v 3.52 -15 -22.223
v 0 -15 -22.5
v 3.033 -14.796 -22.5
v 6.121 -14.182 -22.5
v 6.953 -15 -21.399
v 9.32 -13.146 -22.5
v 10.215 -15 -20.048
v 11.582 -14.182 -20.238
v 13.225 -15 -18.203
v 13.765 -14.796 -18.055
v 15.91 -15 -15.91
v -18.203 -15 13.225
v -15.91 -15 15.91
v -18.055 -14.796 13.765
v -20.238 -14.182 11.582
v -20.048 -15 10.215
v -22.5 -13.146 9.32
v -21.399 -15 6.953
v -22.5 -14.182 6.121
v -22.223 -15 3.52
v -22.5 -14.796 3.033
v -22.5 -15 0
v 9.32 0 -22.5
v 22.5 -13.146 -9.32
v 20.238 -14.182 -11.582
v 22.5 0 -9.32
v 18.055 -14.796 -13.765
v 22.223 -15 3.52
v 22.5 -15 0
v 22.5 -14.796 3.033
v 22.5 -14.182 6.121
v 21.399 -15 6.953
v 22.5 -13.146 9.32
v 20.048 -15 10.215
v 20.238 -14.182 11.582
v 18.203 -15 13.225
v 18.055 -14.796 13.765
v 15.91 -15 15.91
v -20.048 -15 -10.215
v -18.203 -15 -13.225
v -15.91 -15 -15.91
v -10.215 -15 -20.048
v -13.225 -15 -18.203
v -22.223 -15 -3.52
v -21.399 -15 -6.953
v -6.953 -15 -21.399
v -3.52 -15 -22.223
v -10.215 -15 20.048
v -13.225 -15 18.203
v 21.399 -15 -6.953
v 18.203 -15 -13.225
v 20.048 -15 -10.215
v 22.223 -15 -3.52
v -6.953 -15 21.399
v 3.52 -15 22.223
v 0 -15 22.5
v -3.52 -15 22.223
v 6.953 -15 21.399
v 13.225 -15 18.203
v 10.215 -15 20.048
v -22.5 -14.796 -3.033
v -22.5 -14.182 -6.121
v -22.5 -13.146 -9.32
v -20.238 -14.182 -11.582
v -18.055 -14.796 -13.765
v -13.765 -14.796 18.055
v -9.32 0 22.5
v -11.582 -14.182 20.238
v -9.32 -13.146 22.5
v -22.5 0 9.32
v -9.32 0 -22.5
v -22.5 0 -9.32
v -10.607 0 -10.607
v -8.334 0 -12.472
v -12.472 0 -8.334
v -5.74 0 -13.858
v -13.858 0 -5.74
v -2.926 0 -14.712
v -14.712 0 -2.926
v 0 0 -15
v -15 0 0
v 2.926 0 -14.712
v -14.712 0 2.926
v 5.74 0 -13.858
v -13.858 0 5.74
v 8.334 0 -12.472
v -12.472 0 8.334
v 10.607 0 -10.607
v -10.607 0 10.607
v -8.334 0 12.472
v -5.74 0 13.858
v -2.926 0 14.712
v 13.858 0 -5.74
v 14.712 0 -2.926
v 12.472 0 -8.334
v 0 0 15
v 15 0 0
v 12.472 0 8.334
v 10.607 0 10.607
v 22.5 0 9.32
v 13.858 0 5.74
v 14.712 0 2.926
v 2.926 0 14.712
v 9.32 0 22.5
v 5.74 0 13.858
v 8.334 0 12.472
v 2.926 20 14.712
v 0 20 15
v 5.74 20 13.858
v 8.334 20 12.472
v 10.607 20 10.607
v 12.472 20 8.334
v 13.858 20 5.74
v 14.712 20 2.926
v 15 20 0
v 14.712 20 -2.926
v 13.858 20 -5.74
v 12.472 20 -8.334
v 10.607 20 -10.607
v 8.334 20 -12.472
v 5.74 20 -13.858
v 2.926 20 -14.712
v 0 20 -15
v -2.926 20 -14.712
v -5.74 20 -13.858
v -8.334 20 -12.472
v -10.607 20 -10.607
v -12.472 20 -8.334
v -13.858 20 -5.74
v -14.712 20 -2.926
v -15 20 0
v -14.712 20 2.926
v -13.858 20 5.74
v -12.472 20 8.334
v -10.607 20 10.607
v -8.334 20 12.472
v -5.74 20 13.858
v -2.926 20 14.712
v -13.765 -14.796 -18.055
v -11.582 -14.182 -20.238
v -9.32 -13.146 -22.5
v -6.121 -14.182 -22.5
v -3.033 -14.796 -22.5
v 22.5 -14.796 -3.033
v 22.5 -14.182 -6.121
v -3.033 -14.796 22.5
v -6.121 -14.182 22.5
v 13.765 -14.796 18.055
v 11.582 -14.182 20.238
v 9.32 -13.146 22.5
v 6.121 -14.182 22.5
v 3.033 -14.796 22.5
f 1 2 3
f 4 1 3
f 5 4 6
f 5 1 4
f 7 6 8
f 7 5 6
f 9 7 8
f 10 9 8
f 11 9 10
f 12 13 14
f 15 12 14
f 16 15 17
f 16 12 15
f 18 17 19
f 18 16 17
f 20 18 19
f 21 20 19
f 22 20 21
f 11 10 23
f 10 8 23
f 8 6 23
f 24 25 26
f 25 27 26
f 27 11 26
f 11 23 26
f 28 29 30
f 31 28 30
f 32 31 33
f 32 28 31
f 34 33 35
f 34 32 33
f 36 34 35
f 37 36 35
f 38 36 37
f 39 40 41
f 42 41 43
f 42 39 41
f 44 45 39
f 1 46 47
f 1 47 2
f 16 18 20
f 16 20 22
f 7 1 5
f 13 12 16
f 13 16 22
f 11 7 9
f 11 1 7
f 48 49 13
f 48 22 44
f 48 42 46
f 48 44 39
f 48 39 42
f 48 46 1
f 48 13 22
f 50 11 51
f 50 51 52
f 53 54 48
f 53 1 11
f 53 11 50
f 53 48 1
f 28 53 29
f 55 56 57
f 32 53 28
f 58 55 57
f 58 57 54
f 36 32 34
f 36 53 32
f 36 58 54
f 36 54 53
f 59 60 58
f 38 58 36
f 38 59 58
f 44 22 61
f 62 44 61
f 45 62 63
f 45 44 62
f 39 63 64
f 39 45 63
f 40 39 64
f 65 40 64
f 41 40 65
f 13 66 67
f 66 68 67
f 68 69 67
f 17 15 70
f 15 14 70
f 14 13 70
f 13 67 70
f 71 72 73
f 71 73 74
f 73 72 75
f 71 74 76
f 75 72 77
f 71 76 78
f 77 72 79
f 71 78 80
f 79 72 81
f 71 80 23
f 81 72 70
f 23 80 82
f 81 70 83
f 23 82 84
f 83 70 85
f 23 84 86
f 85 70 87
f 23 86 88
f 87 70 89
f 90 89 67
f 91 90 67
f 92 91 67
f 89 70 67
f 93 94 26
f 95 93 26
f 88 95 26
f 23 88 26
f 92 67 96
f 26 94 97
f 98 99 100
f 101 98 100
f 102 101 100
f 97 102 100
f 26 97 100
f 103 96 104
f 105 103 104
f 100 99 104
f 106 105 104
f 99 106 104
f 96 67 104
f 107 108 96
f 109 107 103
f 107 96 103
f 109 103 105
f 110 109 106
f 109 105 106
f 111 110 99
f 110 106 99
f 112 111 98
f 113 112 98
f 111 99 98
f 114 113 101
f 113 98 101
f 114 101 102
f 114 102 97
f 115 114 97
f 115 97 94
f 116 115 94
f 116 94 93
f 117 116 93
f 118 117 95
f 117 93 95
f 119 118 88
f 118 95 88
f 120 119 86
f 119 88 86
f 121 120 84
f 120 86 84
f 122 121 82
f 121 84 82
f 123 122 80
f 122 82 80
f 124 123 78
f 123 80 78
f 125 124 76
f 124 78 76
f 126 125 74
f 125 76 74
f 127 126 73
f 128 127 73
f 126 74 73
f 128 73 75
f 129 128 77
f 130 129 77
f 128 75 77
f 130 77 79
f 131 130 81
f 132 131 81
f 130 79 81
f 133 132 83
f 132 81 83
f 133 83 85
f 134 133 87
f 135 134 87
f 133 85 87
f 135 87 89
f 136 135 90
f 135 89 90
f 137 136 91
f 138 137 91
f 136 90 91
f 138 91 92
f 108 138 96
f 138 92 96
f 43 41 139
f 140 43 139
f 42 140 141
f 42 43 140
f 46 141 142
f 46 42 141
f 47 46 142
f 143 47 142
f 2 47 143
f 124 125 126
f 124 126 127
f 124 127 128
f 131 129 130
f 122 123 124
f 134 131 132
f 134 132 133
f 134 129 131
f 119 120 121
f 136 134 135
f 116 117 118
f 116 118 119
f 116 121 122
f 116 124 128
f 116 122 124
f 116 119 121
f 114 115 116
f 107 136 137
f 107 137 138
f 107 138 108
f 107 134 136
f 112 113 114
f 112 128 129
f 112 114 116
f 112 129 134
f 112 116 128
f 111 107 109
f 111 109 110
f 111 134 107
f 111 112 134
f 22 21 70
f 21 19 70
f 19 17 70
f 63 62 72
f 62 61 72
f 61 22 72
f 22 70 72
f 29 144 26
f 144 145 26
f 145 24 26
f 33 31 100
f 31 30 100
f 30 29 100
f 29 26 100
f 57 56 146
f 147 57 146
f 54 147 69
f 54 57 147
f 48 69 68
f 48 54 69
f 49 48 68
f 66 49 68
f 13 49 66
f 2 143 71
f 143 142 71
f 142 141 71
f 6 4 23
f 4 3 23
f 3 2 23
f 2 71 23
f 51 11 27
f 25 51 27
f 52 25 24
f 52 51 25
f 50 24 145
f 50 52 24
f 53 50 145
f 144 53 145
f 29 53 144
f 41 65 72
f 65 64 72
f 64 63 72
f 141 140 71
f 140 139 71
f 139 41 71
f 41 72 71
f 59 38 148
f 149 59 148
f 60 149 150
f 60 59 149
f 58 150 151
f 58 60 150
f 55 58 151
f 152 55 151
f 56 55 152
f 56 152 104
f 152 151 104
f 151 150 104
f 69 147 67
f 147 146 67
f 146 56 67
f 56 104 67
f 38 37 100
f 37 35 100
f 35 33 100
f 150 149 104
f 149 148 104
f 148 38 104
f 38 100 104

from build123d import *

# Parameters (mm, degrees)
SKETCH1_R           = 15
BOSS_EXTRUDE1_DEPTH = 20
BOSS_EXTRUDE2_DEPTH = 15
SKETCH3_OUTSIDE_W   = 101.526
SKETCH3_OUTSIDE_H   = 101.526
SKETCH3_OUTSIDE_R   = 22.5
CUT_EXTRUDE1_DEPTH  = 20
CUT_EXTRUDE1_DRAFT  = -45


with BuildPart() as part:
    # Sketch1 → Boss-Extrude1 (new body)
    with BuildSketch(Plane(origin=(0, 0, 0), x_dir=(1, 0, 0), z_dir=(0, 1, 0))):
        with Locations(Location((0, 0, 0), (0, 0, 270))):
            Circle(SKETCH1_R)
    extrude(amount=BOSS_EXTRUDE1_DEPTH)

    # Sketch2 → Boss-Extrude2 (add)
    with BuildSketch(Plane.XZ):
        Polygon((22.5, -9.319805153), (22.5, 9.319805153), (9.319805153, 22.5), (-9.319805153, 22.5), (-22.5, 9.319805153), (-22.5, -9.319805153), (-9.319805153, -22.5), (9.319805153, -22.5), align=None)
    extrude(amount=BOSS_EXTRUDE2_DEPTH)


with BuildPart() as cut_extrude1_tool:
    # Sketch3 outside → Cut-Extrude1 (with draft: the straight prism first)
    with BuildSketch(Plane(origin=(0, -15, 0), x_dir=(-1, 0, 0), z_dir=(0, -1, 0))):
        Rectangle(SKETCH3_OUTSIDE_W, SKETCH3_OUTSIDE_H)
        Circle(SKETCH3_OUTSIDE_R, mode=Mode.SUBTRACT)
    extrude(amount=-CUT_EXTRUDE1_DEPTH)
    # Cut-Extrude1: the draft: its side faces are tilted about the plane it starts from
    cut_extrude1_sides = [cut_extrude1_tool.faces().sort_by_distance(p)[0] for p in [
        (0, -5, 50.763),
        (-50.763, -5, 0),
        (0, -5, -50.763),
        (50.763, -5, 0),
        (22.5, -5, 0),
    ]]
    draft(cut_extrude1_sides, Plane(origin=(0, -15, 0), x_dir=(-1, 0, 0), z_dir=(0, -1, 0)), CUT_EXTRUDE1_DRAFT)


with BuildPart() as part_1:
    add(part.part)

    # Cut-Extrude1: cut by cut_extrude1_tool
    add(cut_extrude1_tool.part, mode=Mode.SUBTRACT)


solid = part_1.part
